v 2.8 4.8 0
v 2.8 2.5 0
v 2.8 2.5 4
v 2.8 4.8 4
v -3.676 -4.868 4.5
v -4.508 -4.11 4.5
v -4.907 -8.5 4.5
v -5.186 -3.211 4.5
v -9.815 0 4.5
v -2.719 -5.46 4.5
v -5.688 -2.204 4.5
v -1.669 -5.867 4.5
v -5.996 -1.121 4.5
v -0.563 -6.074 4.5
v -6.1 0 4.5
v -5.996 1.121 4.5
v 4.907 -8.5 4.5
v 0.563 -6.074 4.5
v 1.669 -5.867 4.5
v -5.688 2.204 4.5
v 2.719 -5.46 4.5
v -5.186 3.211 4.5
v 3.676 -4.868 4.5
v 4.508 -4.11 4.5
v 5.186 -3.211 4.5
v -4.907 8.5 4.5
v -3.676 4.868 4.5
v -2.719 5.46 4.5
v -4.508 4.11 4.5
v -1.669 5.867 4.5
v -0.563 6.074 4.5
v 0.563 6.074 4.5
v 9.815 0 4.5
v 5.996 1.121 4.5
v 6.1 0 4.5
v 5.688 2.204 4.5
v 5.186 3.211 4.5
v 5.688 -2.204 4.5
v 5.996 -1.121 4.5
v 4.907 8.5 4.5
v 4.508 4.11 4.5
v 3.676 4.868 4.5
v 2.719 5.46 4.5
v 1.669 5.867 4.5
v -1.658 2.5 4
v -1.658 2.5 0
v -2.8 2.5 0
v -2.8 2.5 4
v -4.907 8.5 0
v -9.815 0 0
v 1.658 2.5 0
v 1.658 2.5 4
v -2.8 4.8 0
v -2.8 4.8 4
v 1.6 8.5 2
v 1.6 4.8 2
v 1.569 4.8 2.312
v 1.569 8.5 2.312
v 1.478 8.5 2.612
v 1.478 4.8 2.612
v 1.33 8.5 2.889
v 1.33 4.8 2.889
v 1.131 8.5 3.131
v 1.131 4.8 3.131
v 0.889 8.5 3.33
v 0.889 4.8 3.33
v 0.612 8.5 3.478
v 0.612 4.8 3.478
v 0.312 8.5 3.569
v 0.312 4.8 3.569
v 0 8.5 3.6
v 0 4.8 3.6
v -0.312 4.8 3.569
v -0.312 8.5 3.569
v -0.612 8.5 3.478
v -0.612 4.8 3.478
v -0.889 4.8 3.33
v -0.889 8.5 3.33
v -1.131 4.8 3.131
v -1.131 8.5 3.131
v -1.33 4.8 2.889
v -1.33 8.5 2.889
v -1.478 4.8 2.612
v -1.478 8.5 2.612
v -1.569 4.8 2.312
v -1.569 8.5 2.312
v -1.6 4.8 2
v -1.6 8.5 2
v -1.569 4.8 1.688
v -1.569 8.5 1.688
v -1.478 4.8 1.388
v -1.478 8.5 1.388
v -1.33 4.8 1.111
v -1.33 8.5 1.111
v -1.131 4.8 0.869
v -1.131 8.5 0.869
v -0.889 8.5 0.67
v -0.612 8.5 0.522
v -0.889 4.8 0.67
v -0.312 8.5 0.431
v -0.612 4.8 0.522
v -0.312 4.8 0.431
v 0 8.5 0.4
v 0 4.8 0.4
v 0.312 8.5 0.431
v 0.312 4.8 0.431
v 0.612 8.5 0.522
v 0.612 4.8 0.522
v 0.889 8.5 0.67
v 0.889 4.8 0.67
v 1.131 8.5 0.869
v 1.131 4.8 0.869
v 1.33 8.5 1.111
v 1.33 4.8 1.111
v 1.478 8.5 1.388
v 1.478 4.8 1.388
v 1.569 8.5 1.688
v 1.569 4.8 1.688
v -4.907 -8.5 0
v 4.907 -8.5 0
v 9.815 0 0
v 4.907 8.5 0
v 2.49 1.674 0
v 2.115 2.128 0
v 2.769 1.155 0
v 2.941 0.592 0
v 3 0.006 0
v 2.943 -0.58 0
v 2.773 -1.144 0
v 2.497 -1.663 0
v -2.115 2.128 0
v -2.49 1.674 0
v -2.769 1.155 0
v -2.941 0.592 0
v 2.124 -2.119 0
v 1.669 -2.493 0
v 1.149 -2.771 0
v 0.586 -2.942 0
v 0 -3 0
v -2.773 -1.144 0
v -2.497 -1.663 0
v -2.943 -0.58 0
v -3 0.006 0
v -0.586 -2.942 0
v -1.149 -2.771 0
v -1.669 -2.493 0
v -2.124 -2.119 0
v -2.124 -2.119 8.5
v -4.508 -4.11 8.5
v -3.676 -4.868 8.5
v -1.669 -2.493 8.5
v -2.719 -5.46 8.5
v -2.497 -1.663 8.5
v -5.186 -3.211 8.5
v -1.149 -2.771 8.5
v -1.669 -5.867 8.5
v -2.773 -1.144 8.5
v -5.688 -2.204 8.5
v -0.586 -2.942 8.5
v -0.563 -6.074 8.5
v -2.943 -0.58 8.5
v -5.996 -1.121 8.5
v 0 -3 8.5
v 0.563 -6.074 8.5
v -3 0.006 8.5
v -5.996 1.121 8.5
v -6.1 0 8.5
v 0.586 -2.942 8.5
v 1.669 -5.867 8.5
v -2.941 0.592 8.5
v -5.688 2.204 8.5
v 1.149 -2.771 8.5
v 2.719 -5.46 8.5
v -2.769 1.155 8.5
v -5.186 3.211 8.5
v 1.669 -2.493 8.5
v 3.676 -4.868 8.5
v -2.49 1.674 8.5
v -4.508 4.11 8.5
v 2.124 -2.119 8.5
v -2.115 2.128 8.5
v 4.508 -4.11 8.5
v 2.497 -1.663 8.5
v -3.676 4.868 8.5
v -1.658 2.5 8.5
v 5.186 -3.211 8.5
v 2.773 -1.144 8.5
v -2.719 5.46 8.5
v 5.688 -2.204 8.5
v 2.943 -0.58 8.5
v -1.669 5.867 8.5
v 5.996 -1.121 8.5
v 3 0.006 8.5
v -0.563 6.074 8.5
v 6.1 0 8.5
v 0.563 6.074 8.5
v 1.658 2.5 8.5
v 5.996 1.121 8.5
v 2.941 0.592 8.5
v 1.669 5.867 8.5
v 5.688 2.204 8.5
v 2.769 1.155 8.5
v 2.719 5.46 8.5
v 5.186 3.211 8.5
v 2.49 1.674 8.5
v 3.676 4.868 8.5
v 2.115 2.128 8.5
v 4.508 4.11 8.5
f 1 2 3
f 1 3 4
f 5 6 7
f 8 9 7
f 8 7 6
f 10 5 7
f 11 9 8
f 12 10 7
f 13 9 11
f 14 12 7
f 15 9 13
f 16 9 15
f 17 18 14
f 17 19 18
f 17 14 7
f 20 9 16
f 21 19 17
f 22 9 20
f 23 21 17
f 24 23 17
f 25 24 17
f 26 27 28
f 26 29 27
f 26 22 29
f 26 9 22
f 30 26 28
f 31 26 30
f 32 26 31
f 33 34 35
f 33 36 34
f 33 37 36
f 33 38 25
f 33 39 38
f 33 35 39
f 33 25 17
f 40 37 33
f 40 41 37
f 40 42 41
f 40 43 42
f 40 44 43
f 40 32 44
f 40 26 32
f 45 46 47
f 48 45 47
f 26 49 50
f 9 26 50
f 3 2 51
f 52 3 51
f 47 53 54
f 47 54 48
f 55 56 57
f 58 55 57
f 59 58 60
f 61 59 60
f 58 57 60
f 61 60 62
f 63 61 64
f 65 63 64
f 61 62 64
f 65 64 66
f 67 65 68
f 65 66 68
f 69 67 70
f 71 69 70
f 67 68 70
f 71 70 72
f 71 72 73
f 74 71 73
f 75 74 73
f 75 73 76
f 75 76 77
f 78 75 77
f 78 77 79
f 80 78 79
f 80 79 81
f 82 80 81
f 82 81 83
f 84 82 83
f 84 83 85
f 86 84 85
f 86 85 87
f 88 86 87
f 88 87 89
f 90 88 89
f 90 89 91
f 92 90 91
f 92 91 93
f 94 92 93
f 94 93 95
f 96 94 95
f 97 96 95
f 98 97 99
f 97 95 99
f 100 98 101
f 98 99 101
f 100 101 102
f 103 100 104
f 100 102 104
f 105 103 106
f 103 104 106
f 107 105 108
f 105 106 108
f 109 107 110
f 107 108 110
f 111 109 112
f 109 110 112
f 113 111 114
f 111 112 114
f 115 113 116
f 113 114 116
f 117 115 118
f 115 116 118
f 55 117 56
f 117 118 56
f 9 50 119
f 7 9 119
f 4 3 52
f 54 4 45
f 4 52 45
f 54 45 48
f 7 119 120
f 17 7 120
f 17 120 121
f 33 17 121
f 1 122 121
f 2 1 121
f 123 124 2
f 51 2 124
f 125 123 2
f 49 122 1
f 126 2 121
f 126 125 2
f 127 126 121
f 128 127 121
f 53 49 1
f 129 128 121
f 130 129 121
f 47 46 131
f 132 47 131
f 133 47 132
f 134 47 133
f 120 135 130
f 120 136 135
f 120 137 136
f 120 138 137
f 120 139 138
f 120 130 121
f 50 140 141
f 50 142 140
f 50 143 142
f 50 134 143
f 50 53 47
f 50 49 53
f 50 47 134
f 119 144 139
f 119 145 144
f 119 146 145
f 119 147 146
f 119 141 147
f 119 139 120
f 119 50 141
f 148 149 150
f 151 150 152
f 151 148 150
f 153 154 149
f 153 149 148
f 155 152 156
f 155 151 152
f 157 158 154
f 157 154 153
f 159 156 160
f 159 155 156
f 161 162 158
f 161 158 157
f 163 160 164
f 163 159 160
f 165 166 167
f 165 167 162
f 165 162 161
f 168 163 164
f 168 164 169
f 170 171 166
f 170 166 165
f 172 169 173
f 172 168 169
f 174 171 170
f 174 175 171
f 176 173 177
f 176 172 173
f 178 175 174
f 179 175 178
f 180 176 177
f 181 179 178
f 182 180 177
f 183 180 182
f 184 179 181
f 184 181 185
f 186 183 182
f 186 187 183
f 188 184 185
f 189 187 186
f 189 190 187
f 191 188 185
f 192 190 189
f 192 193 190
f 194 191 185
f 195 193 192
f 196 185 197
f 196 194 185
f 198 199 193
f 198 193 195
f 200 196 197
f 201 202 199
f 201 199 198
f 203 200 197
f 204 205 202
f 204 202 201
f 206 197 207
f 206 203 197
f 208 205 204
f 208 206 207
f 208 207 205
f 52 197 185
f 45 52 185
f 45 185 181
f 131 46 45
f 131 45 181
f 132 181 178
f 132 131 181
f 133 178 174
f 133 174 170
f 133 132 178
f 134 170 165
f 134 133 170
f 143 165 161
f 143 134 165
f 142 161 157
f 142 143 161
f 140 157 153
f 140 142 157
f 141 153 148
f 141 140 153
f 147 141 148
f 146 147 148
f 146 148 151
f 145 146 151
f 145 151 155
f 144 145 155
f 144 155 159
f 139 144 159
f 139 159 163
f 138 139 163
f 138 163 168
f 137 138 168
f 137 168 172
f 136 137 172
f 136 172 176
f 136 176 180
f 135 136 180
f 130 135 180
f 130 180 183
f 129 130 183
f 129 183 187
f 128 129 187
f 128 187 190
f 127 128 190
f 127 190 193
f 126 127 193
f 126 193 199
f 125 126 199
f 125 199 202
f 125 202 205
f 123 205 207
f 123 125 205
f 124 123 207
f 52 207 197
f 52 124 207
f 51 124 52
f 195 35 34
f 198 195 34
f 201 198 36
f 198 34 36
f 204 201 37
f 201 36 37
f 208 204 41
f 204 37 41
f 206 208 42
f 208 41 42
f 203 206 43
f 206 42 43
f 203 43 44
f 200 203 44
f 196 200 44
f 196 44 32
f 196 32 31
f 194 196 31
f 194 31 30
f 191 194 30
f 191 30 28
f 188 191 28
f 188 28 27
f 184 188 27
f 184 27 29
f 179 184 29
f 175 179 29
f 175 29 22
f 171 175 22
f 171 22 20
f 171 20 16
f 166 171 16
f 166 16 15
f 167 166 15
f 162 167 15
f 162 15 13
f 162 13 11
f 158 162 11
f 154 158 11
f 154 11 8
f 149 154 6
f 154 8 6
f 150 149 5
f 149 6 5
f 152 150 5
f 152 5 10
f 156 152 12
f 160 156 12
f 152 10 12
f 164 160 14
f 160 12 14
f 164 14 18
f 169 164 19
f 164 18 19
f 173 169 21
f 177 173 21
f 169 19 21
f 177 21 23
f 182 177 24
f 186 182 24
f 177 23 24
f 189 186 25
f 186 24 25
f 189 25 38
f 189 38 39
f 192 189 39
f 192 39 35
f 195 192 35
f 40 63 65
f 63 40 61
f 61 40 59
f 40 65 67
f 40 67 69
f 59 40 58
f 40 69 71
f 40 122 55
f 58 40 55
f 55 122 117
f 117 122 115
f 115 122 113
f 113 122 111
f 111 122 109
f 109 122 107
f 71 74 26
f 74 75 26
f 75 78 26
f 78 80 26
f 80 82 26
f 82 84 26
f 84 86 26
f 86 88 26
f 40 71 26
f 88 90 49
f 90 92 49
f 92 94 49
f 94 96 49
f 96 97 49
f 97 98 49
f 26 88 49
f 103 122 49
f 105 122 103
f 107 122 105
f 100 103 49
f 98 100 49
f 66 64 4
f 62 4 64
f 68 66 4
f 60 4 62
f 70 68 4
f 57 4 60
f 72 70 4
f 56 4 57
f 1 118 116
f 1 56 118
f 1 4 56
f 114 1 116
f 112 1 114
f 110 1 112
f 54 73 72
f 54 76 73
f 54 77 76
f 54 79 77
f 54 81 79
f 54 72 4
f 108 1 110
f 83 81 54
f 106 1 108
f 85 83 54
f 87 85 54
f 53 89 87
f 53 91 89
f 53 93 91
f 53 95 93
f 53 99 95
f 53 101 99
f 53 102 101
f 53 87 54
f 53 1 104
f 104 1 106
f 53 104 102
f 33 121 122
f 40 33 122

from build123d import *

# Parameters (mm, degrees)
SKETCH_R        = 3
PAD_DEPTH       = 4.5
SKETCH001_R     = 6.1
SKETCH001_R_2   = 3
PAD001_DEPTH    = 10
PAD002_DEPTH    = 13
SKETCH003_R     = 6.1
POCKET_DEPTH    = 6
PAD003_DEPTH    = 1.5
POCKET001_DEPTH = 4
SKETCH005_R     = 1.6
POCKET002_DEPTH = 3.701


with BuildPart() as part:
    # Sketch → Pad (new body)
    with BuildSketch(Plane.XY):
        Polygon((9.814955, 0), (4.907477, 8.5), (-4.907477, 8.5), (-9.814955, 0), (-4.907477, -8.5), (4.907477, -8.5), align=None)
        Circle(SKETCH_R, mode=Mode.SUBTRACT)
    extrude(amount=PAD_DEPTH)

    # Sketch001 (on Face9 of Pad) → Pad001 (join)
    with BuildSketch(Plane.XY.offset(4.5)):
        Circle(SKETCH001_R)
        Circle(SKETCH001_R_2, mode=Mode.SUBTRACT)
    extrude(amount=PAD001_DEPTH)

    # Sketch002 (on Face12 of Pad001) → Pad002 (join)
    with BuildSketch(Plane.XY.offset(14.5)):
        with BuildLine():
            Line((-1.658312, 2.5), (1.658312, 2.5))
            ThreePointArc((1.658312, 2.5), (0, 3), (-1.658312, 2.5))
        make_face()
    extrude(amount=-PAD002_DEPTH)

    # Sketch003 (on Face15 of Pad002) → Pocket (cut)
    with BuildSketch(Plane.XY.offset(14.5)):
        Circle(SKETCH003_R)
    extrude(amount=-POCKET_DEPTH, mode=Mode.SUBTRACT)

    # Pocket Face13 → Pad003 (add)
    with BuildSketch(Plane(origin=(0, 2.701501, 1.5), x_dir=(0, -1, 0), z_dir=(0, 0, -1))):
        with BuildLine():
            Line((0.201501, -1.658312), (0.201501, 1.658312))
            ThreePointArc((0.201501, 1.658312), (-0.298499, 0), (0.201501, -1.658312))
        make_face()
    extrude(amount=PAD003_DEPTH)

    # Sketch004 (on Face4 of Pad003) → Pocket001 (cut)
    with BuildSketch(Plane(origin=(0, 0, 0), x_dir=(1, 0, 0), z_dir=(0, 0, -1))):
        Polygon((2.8, -2.5), (2.8, -4.8), (-2.8, -4.8), (-2.8, -2.5), (0, -2.5), align=None)
    extrude(amount=-POCKET001_DEPTH, mode=Mode.SUBTRACT)

    # Sketch005 (on Face12 of Pocket001) → Pocket002 (cut, through all)
    with BuildSketch(Plane.XZ.offset(-4.8)):
        with Locations((0, 2)):
            Circle(SKETCH005_R)
    extrude(amount=-POCKET002_DEPTH, mode=Mode.SUBTRACT)


solid = part.part
